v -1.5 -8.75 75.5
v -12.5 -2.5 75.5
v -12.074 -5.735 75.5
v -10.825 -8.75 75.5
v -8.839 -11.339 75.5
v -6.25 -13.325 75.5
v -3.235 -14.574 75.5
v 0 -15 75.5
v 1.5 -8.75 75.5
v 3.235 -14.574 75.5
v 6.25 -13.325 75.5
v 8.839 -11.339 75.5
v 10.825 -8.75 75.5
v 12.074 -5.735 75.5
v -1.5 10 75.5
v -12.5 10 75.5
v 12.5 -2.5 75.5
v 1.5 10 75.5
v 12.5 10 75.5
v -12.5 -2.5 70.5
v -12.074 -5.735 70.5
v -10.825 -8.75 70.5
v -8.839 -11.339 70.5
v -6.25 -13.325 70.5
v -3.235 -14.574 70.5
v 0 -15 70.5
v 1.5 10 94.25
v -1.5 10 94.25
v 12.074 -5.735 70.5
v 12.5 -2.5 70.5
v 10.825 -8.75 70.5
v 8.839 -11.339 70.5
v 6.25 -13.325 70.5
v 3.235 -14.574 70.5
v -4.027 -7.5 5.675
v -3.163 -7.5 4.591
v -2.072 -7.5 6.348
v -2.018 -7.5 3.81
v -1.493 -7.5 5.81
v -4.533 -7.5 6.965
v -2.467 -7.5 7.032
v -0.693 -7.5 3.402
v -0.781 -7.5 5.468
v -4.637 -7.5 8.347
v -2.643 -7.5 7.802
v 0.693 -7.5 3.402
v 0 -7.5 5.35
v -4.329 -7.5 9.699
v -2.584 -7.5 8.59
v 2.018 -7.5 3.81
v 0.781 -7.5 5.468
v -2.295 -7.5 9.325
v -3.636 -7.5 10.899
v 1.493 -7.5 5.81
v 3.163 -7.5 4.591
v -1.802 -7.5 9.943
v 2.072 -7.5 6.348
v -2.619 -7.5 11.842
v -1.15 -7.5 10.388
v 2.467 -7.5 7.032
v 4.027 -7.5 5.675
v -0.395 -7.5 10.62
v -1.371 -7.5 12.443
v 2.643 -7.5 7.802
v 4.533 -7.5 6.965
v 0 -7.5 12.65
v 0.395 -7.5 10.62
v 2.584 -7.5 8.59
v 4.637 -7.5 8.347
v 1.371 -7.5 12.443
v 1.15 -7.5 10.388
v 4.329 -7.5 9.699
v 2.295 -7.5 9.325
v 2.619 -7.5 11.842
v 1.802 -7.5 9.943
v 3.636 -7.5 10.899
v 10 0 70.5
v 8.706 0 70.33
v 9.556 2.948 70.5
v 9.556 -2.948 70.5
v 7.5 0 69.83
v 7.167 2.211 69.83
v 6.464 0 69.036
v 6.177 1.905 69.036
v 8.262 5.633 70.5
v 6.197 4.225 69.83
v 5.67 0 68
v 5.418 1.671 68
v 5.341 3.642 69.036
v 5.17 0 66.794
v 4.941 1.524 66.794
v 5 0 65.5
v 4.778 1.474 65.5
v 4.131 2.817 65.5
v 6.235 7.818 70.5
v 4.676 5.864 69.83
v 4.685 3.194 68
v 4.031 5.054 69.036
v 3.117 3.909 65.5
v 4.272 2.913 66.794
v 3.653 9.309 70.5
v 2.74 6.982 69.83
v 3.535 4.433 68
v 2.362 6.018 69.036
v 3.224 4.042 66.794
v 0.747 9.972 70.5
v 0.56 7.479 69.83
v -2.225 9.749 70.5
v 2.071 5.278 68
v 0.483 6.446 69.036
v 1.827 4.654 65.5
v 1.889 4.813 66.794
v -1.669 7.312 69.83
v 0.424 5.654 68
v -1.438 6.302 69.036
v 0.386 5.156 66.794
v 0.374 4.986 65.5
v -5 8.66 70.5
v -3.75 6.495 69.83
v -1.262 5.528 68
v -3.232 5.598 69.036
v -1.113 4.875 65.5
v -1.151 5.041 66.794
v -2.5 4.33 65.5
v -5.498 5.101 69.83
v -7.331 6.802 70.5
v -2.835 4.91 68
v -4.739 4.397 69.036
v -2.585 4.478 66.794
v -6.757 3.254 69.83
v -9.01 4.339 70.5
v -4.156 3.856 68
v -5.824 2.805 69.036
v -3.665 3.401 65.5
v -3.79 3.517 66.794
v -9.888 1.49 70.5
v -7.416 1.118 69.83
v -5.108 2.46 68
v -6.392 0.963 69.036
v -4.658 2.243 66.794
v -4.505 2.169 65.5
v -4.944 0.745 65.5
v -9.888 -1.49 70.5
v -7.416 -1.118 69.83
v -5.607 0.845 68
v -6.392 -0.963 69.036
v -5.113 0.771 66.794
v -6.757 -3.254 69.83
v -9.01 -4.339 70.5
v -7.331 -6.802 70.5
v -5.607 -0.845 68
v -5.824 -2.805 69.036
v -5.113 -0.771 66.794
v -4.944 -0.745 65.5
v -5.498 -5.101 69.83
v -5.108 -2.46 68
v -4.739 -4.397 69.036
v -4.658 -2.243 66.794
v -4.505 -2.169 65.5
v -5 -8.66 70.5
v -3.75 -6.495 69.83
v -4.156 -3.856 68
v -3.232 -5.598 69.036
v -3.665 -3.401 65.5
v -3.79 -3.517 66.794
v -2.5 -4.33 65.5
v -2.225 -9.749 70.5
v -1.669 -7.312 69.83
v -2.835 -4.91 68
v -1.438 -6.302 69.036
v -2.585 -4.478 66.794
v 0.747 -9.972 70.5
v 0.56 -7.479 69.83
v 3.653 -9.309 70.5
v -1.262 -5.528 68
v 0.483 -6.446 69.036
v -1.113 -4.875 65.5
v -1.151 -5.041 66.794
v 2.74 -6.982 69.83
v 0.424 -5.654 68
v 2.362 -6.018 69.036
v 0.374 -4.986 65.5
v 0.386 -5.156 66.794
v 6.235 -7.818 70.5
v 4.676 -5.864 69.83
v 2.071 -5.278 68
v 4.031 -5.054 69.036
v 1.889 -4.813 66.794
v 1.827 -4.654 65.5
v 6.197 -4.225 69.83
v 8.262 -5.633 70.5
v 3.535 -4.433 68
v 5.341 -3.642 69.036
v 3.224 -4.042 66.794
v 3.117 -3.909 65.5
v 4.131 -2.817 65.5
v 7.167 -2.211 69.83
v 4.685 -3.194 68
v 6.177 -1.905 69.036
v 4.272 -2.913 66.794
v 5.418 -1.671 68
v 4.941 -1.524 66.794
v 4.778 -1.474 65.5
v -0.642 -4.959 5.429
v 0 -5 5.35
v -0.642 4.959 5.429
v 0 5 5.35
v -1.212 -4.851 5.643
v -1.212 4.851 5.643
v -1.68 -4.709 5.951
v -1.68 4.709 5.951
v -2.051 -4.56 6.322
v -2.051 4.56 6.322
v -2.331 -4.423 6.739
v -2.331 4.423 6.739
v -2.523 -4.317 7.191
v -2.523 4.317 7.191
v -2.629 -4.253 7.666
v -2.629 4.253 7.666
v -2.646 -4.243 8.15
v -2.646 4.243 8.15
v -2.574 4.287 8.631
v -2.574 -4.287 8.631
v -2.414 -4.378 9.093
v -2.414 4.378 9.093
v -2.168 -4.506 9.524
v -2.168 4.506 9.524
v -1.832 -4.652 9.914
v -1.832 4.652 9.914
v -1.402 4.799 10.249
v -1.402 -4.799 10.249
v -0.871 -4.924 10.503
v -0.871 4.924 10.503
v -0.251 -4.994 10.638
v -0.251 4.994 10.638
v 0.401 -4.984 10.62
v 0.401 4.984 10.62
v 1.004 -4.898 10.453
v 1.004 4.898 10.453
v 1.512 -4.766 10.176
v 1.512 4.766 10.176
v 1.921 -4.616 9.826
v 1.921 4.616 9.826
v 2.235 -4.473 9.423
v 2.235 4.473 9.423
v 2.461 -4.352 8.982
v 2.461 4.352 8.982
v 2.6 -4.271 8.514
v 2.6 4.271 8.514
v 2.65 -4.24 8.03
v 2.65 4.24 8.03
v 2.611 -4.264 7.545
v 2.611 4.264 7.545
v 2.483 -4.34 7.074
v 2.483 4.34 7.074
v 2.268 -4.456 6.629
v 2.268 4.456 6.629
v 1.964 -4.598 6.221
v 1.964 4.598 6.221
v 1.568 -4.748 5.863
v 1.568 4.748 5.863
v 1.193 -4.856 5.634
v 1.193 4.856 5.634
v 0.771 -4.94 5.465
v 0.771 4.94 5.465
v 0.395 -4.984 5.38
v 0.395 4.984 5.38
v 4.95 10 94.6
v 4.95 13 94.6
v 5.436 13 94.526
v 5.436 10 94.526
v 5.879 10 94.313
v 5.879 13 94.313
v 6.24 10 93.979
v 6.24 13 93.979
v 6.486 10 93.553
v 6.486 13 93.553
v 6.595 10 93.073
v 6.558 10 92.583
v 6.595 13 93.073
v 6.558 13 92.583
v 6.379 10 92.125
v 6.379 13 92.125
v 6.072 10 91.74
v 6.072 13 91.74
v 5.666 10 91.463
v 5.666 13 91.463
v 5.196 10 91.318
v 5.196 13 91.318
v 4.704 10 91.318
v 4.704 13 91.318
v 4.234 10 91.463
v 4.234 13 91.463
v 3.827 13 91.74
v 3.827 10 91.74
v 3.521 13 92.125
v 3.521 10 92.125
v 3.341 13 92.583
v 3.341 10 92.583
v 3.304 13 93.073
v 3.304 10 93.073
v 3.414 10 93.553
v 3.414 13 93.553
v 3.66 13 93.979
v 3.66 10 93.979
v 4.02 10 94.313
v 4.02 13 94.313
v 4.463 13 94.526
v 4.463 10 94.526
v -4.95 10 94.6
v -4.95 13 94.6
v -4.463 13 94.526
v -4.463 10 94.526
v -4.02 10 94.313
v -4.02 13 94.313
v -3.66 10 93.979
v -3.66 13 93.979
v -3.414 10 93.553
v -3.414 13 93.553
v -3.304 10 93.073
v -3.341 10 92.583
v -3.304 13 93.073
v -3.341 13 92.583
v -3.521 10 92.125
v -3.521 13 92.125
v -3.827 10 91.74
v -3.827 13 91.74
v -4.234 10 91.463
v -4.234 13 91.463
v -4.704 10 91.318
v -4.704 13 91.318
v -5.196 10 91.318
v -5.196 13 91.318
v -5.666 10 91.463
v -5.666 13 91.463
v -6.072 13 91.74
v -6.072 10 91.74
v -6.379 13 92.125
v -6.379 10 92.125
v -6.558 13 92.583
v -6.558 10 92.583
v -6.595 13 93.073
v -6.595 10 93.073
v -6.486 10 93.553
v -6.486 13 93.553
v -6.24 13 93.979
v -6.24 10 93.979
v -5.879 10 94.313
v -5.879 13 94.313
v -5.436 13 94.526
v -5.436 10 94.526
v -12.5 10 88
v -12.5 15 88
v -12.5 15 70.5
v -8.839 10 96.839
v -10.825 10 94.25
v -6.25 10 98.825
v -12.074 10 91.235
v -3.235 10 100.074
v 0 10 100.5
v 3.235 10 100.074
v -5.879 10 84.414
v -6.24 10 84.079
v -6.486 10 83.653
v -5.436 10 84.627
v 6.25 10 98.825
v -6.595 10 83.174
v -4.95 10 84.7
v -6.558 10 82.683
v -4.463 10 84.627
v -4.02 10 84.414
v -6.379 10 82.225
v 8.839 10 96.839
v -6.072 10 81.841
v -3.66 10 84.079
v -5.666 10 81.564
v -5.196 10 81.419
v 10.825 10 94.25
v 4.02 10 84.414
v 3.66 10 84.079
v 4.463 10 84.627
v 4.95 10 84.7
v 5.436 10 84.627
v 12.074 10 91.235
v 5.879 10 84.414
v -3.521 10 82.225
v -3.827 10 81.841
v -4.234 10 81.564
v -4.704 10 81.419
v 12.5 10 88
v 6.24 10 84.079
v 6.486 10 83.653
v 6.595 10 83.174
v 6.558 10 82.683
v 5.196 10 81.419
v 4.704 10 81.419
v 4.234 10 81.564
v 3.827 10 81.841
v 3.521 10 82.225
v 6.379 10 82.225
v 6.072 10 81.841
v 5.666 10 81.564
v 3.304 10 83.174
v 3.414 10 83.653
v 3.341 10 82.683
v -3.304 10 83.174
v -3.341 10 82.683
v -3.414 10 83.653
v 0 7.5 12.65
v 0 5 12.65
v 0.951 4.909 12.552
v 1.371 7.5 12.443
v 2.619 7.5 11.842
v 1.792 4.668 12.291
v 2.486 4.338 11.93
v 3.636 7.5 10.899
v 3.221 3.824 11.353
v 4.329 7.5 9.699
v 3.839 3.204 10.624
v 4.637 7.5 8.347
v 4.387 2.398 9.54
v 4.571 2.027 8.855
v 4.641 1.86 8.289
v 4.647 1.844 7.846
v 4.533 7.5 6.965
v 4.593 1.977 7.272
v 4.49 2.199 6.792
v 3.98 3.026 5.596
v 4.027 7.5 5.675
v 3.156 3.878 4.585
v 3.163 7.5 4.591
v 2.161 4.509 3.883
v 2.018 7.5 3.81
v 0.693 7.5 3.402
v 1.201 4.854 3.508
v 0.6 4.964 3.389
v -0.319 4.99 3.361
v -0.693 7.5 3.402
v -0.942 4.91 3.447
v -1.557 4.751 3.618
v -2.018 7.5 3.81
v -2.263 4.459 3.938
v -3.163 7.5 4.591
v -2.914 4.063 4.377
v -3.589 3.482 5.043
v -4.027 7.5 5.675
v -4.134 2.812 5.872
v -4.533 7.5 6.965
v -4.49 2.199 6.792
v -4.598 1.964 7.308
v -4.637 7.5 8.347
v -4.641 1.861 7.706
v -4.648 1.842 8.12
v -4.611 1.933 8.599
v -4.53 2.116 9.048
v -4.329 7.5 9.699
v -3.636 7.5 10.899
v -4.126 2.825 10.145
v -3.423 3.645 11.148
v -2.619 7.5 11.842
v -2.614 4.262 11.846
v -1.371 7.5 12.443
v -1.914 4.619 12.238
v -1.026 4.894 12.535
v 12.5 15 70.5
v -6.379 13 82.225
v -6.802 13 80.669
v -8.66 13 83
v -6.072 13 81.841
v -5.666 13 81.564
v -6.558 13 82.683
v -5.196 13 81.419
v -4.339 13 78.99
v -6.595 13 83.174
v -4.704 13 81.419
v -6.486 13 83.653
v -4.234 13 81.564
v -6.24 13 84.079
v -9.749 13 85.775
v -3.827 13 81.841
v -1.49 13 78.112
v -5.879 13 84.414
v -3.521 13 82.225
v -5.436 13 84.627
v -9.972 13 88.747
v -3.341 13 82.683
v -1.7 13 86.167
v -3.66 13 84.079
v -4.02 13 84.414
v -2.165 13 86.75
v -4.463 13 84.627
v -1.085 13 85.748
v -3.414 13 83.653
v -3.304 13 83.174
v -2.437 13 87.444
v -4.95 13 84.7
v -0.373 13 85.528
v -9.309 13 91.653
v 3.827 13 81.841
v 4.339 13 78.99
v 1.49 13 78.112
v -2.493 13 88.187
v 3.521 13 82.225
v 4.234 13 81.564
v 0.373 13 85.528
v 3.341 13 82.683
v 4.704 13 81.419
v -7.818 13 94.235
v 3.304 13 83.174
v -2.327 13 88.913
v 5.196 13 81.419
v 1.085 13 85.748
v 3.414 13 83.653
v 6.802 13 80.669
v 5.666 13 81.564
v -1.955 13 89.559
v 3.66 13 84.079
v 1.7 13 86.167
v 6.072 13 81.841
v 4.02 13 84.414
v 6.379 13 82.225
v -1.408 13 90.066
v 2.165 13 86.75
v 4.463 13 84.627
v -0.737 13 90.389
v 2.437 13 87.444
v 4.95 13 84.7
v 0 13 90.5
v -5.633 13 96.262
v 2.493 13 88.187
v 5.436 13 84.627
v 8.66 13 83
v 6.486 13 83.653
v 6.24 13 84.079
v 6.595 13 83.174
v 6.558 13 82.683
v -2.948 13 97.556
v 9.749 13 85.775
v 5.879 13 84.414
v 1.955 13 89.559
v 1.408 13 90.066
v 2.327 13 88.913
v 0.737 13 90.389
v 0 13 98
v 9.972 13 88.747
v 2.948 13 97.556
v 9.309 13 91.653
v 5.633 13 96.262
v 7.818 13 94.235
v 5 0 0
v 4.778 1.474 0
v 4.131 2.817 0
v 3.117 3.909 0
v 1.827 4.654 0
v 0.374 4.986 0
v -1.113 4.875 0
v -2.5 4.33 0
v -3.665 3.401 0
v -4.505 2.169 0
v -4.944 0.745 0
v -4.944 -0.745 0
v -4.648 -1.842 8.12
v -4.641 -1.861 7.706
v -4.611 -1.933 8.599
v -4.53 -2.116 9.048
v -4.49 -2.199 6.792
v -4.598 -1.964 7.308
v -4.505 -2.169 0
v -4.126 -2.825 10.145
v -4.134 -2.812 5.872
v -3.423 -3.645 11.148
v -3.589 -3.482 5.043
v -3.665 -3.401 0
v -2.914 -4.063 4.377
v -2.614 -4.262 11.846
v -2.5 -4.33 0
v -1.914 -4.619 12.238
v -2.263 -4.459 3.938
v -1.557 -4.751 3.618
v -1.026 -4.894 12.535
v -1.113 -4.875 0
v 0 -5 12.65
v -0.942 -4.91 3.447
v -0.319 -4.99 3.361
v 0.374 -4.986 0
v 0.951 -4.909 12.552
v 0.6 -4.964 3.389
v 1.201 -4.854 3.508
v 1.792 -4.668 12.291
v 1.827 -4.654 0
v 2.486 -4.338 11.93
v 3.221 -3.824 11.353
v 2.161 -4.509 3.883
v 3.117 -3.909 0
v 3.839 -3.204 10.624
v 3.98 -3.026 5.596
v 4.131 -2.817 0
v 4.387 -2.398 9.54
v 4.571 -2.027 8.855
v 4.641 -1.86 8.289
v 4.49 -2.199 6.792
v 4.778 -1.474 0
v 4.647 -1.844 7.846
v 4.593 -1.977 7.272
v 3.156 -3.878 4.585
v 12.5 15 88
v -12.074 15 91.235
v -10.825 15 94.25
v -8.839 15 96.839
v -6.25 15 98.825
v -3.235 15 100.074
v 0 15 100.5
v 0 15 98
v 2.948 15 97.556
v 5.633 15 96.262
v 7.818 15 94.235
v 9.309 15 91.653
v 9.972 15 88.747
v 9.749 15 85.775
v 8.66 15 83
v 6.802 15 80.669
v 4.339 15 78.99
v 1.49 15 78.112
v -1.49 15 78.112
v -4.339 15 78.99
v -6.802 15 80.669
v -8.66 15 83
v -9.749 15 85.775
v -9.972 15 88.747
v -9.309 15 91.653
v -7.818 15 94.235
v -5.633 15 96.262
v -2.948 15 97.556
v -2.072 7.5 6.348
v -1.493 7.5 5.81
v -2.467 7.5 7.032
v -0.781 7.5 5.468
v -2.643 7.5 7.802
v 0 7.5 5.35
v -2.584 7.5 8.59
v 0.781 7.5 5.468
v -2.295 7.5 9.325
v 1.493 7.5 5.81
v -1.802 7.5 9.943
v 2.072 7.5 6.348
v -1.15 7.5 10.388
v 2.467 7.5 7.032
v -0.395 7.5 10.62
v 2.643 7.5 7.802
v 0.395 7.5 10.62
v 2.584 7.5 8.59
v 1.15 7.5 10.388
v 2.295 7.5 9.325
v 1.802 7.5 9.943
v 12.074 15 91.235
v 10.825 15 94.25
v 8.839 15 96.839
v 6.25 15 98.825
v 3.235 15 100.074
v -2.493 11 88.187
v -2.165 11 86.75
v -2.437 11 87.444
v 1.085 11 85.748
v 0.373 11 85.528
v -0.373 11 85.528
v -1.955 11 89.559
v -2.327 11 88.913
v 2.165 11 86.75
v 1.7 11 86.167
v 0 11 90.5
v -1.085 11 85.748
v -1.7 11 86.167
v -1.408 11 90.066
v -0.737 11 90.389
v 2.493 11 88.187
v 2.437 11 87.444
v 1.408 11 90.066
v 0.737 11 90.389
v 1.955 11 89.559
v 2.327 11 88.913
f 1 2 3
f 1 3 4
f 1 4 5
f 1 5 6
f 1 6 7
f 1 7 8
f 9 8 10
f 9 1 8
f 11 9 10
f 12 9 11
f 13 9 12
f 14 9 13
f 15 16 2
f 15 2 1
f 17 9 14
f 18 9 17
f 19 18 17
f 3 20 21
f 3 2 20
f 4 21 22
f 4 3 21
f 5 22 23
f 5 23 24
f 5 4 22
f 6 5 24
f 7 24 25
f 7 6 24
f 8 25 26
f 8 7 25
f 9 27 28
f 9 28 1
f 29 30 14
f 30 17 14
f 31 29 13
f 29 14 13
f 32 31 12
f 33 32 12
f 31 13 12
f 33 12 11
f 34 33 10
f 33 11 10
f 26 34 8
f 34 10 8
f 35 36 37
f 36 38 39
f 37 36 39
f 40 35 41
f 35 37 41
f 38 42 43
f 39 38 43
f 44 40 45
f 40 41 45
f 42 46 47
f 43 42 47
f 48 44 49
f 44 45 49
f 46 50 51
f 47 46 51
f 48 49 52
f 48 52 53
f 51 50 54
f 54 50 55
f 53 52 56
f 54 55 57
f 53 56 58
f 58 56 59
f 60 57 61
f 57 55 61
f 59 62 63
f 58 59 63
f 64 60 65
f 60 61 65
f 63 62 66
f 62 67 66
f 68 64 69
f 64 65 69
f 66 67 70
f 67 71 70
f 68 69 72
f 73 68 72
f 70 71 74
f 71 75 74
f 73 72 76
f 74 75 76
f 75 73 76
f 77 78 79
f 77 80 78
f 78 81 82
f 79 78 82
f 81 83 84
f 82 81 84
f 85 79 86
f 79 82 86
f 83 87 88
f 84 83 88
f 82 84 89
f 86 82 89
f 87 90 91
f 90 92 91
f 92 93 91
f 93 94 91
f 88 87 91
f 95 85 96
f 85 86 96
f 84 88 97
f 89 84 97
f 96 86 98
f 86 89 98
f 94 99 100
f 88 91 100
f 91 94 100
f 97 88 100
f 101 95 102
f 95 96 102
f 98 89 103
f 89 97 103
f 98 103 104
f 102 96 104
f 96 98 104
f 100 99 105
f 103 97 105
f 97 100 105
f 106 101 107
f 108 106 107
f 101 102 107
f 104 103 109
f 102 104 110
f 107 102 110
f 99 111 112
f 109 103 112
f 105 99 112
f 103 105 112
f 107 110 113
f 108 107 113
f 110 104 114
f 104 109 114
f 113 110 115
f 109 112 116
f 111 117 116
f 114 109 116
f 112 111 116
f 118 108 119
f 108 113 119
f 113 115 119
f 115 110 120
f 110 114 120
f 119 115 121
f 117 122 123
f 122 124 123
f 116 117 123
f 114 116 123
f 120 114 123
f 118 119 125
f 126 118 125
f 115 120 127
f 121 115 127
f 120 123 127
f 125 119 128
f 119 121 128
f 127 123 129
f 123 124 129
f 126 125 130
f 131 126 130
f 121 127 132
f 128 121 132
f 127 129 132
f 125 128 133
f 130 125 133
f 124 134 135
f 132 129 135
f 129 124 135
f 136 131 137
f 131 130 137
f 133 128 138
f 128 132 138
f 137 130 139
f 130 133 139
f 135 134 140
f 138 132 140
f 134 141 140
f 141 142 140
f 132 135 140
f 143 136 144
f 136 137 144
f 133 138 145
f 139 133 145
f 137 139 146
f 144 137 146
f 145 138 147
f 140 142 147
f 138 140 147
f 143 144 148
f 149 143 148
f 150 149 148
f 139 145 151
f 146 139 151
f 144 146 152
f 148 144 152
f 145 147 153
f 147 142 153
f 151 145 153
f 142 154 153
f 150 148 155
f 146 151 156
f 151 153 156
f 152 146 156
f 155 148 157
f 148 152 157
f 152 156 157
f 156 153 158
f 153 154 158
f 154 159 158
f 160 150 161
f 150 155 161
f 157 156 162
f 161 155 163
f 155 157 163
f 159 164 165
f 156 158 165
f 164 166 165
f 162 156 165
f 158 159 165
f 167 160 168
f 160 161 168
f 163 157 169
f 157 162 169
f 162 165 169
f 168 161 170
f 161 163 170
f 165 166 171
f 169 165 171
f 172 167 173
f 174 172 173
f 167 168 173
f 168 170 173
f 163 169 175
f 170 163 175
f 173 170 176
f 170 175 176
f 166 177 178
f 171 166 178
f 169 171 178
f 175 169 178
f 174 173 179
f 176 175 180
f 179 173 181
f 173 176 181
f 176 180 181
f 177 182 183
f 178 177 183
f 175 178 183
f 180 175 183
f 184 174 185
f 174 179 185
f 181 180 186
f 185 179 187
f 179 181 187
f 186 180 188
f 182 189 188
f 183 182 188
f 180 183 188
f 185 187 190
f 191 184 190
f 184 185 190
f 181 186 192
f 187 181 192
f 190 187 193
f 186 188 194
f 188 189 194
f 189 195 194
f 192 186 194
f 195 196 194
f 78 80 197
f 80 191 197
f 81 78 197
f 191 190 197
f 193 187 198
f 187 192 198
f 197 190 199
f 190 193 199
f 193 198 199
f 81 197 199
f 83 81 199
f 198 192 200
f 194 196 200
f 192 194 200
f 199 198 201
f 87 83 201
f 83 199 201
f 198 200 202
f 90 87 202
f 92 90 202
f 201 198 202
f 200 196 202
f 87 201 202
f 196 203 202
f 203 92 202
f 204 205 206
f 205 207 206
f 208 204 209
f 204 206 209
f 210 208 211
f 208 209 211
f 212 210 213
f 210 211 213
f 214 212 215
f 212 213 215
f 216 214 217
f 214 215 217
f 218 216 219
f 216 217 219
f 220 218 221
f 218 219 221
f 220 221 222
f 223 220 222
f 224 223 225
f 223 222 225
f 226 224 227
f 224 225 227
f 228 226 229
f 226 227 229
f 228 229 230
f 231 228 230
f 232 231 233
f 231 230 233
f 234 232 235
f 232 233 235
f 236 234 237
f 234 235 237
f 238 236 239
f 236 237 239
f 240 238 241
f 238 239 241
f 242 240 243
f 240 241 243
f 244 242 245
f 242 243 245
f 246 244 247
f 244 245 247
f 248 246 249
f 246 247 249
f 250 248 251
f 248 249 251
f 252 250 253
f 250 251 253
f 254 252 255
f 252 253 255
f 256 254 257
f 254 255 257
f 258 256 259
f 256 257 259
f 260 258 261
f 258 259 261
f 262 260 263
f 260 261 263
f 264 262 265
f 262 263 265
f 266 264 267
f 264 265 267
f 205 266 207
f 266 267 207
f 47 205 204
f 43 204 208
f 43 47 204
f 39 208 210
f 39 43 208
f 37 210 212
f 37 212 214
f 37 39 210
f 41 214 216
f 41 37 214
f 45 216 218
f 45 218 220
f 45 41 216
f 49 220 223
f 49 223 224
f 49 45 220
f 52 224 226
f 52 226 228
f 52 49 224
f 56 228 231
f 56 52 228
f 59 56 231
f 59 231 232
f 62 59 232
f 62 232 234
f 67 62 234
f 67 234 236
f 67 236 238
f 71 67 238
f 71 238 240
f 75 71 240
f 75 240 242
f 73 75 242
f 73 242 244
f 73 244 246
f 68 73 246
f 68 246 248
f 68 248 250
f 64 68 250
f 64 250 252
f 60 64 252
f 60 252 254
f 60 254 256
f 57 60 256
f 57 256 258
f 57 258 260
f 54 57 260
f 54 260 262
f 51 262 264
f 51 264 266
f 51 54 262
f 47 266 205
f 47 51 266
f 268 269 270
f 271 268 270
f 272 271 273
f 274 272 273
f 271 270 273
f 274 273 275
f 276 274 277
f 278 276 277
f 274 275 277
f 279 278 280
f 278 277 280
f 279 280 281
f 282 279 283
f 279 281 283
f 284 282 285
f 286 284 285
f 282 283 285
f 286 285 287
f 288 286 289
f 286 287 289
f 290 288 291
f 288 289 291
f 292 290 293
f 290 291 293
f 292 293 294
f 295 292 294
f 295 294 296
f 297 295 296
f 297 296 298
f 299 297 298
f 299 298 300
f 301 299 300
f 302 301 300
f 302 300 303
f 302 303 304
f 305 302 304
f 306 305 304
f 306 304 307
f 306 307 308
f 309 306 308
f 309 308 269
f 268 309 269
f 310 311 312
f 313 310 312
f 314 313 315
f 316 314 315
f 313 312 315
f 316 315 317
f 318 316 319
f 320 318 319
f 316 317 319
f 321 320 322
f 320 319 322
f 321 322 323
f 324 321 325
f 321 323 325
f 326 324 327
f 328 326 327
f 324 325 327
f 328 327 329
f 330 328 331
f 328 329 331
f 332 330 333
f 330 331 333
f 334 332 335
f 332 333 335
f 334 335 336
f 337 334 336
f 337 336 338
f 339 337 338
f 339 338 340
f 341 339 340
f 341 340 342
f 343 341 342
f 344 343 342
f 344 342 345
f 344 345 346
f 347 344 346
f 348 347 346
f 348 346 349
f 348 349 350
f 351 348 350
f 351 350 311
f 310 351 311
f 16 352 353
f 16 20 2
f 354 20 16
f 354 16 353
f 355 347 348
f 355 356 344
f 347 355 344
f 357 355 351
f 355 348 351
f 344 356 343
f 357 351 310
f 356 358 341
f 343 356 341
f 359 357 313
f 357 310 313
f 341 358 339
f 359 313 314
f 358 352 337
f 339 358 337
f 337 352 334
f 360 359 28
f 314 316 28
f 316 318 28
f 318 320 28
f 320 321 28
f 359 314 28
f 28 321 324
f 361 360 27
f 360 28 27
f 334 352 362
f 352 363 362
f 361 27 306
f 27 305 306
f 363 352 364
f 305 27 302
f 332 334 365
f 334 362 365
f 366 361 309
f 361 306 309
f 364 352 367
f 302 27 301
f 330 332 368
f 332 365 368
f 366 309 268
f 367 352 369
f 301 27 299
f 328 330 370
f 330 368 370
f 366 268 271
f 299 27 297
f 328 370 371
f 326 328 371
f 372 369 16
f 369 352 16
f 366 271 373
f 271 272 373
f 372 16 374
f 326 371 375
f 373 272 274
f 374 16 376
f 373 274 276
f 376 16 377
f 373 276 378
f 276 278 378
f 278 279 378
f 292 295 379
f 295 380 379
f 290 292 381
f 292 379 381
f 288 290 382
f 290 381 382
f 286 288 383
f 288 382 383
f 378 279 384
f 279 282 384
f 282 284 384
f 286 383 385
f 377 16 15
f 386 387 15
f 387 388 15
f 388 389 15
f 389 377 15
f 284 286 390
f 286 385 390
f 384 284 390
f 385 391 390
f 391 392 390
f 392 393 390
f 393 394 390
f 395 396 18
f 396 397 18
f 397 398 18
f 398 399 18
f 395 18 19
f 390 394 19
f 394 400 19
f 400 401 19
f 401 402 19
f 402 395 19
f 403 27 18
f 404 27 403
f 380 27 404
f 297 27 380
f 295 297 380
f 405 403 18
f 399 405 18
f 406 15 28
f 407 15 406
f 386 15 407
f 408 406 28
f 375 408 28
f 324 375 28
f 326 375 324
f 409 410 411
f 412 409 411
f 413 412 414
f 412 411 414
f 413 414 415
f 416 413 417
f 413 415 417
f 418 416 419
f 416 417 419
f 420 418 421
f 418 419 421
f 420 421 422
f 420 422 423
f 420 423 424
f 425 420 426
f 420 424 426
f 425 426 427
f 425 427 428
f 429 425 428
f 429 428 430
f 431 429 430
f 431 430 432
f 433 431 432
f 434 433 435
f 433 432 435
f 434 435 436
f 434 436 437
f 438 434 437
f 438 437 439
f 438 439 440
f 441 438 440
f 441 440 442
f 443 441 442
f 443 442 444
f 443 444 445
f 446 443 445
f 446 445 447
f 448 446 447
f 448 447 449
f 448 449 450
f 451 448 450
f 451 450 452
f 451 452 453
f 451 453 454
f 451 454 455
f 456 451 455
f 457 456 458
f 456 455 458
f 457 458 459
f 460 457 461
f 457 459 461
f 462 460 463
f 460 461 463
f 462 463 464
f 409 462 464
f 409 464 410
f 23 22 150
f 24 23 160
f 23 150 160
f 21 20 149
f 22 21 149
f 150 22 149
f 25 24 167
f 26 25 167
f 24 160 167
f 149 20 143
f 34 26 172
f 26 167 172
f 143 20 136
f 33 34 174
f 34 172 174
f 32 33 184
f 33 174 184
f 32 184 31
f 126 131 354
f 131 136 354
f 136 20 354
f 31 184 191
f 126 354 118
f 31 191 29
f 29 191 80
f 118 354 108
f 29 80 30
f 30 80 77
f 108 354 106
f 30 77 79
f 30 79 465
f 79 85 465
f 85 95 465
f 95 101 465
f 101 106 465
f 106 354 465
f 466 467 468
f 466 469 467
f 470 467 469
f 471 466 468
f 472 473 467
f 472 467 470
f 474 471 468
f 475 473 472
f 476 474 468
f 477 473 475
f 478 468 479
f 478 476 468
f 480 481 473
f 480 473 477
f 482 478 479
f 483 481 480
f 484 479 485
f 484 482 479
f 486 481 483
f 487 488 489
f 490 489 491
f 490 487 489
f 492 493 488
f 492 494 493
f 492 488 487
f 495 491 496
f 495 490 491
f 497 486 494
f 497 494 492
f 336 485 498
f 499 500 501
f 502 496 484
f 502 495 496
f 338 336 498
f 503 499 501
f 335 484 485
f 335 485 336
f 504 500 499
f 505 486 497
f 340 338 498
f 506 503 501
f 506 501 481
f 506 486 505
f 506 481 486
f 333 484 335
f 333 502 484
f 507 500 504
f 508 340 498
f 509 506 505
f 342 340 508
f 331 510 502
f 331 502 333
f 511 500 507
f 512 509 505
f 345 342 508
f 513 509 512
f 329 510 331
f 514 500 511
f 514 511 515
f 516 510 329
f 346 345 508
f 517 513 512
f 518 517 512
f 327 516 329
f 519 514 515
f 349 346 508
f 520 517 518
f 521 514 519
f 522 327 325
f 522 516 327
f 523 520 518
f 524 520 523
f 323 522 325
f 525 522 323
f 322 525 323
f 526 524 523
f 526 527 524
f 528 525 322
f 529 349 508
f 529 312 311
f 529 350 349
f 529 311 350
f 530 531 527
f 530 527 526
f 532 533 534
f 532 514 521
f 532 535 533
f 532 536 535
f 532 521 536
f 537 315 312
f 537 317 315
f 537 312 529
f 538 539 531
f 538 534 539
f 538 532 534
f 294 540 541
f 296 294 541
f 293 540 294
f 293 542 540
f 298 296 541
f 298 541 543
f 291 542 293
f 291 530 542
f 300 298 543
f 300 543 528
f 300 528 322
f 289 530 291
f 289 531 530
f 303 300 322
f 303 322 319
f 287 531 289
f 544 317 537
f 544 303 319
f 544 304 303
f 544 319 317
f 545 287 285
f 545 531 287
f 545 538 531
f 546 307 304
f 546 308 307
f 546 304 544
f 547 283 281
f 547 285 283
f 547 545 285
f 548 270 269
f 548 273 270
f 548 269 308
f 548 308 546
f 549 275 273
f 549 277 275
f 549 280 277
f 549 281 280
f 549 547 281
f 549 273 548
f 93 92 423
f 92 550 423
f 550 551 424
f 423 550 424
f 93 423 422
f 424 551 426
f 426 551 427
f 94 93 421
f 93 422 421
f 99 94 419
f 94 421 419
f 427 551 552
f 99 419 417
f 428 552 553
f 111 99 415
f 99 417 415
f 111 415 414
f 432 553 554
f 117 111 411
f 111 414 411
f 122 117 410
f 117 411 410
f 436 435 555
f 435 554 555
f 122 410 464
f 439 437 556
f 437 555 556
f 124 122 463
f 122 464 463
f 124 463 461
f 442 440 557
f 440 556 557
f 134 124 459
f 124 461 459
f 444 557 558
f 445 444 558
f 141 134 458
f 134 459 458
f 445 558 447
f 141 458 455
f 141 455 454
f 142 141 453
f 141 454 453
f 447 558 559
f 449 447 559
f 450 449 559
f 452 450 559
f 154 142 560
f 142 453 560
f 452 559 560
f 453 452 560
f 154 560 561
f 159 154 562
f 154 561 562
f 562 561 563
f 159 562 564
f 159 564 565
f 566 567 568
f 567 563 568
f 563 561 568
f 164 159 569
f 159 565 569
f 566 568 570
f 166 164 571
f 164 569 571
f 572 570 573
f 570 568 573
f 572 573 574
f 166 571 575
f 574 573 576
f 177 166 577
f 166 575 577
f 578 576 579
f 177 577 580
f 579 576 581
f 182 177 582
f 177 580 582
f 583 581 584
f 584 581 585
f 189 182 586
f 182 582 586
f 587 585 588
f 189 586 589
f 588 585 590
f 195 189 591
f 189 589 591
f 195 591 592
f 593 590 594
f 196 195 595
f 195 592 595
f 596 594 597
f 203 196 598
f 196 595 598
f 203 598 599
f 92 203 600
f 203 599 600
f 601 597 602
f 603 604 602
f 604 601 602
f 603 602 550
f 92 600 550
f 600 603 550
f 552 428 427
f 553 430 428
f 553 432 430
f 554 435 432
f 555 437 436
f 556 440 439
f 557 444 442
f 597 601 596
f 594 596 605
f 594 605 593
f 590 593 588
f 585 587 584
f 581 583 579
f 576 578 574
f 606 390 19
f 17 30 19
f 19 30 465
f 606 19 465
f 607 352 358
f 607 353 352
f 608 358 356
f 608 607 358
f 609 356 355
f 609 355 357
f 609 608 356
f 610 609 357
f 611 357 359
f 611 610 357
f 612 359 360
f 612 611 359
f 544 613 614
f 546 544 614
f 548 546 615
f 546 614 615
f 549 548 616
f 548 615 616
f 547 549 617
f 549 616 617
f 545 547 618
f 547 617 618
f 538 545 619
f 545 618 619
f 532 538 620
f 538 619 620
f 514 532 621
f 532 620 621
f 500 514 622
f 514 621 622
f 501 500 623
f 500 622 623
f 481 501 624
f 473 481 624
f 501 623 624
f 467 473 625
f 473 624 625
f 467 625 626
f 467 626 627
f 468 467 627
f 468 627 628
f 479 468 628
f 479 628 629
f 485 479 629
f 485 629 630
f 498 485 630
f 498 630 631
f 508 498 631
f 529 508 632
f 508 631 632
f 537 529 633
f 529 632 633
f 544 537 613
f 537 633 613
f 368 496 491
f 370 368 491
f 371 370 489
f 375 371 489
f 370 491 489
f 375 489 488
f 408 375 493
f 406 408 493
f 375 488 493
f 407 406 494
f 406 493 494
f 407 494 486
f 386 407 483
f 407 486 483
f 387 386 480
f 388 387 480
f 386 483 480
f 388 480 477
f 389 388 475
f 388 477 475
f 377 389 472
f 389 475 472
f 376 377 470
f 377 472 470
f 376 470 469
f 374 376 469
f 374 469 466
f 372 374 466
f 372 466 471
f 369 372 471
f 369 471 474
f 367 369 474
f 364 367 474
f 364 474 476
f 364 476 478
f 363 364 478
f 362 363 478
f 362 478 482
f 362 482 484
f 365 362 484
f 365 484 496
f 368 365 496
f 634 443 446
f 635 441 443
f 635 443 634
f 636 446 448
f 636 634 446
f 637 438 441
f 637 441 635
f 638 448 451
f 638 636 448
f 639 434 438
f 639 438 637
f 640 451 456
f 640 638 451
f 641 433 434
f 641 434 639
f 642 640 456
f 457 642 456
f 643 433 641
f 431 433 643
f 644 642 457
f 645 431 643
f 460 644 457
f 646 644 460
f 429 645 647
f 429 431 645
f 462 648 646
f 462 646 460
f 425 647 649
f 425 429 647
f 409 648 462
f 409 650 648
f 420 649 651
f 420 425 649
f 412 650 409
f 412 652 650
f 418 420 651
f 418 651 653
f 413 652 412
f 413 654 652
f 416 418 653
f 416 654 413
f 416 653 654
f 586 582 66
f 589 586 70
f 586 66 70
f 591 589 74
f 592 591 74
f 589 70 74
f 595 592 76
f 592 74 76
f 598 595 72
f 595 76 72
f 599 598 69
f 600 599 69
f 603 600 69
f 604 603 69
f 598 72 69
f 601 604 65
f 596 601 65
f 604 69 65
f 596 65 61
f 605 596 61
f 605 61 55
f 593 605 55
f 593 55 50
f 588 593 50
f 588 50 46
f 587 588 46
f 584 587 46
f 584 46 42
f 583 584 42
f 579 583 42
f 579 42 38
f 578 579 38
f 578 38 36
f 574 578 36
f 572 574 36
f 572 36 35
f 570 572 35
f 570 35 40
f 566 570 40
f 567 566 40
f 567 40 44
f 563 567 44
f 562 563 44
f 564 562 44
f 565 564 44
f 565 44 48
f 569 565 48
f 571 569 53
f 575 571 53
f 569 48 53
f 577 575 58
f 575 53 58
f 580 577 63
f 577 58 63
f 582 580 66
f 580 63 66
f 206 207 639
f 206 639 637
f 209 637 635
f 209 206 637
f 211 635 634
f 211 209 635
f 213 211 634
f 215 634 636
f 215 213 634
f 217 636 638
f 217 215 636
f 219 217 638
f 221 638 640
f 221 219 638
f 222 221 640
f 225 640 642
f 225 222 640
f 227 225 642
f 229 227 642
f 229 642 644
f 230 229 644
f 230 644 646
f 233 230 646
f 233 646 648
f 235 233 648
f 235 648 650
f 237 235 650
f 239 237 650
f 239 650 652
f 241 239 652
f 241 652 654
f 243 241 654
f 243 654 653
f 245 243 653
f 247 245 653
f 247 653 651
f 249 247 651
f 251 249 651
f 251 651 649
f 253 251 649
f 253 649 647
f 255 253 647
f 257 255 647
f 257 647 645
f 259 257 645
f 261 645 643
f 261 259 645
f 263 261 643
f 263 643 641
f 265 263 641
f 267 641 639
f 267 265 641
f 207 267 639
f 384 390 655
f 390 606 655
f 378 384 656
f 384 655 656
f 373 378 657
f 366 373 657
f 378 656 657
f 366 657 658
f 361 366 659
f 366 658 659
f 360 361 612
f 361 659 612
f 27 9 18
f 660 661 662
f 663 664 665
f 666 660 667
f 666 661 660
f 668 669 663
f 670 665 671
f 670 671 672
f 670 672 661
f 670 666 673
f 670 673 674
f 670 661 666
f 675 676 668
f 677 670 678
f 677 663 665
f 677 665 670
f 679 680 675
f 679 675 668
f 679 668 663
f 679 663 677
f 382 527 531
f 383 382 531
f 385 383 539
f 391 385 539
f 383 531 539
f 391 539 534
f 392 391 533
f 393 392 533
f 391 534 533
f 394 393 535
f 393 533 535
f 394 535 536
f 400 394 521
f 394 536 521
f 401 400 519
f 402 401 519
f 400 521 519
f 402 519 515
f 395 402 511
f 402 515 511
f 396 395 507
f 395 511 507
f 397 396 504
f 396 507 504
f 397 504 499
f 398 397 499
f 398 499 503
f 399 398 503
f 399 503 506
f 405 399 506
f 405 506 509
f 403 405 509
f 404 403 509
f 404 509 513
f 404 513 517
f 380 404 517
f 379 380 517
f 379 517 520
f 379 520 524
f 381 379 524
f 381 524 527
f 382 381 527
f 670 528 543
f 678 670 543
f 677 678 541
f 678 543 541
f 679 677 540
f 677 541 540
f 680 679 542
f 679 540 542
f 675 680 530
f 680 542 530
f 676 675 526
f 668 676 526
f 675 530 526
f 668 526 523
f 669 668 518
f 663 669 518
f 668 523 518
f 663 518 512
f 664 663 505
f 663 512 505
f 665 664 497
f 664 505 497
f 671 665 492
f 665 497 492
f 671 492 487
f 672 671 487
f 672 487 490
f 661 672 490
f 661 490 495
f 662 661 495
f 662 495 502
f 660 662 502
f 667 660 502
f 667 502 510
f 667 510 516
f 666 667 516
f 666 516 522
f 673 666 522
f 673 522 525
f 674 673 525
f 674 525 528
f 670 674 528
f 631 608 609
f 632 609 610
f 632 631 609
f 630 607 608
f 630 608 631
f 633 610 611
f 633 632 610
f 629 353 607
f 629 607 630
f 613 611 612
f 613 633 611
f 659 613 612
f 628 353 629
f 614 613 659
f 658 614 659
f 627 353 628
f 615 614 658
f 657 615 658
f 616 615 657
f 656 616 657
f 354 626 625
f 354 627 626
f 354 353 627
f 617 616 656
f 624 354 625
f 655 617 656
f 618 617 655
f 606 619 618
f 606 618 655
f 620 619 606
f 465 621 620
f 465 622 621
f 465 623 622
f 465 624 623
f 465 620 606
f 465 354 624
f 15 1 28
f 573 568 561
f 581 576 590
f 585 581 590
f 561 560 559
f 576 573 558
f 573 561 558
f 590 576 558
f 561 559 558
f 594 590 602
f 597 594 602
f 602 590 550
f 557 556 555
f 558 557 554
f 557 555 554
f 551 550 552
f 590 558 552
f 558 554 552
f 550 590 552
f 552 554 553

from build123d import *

# Parameters (mm, degrees)
SKETCH1_R                           = 5
BOSS_EXTRUDE1_DEPTH                 = 70.5
SKETCH3_W                           = 25
SKETCH3_H                           = 30
BOSS_EXTRUDE3_DEPTH                 = 5
SKETCH4_W                           = 25
SKETCH4_H                           = 5
BOSS_EXTRUDE4_DEPTH                 = 25
FILLET3_R                           = 12.5
CUT_EXTRUDE1_REACH                  = 107.624
SKETCH6_R                           = 1.65
SKETCH6_3_R                         = 10
SKETCH6_3_R_2                       = 1.65
SKETCH6_3_R_3                       = 2.5
CUT_EXTRUDE2_DEPTH                  = 2
SKETCH6_4_R                         = 2.5
CUT_EXTRUDE3_DEPTH                  = 4
FILLET4_R                           = 5
CUT_EXTRUDE4_REACH                  = 104.379
CUT_EXTRUDE4_END_RADIUS             = 5
SKETCH7_R                           = 2.65
CUT_EXTRUDE4_DIRECTION_2_REACH      = 104.379
CUT_EXTRUDE4_DIRECTION_2_END_RADIUS = 5
BOSS_EXTRUDE6_DEPTH                 = 7.5
BOSS_EXTRUDE6_DEPTH_BACK            = 7.5
SKETCH7_3_R                         = 4.65
SKETCH7_3_R_2                       = 2.65
BOSS_EXTRUDE7_DEPTH                 = 1.5
BOSS_EXTRUDE7_DEPTH_BACK            = 1.5


with BuildPart() as part:
    # Sketch1 → Boss-Extrude1 (new body)
    with BuildSketch(Plane(origin=(0, 0, 0), x_dir=(0, 1, 0), z_dir=(0, 0, 1))):
        with Locations(Location((0, 0, 0), (0, 0, 270))):
            Circle(SKETCH1_R)
    extrude(amount=BOSS_EXTRUDE1_DEPTH)

    # Sketch3 → Boss-Extrude3 (add)
    with BuildSketch(Plane.XY.offset(70.5)):
        Rectangle(SKETCH3_W, SKETCH3_H)
    extrude(amount=BOSS_EXTRUDE3_DEPTH)

    # Sketch4 → Boss-Extrude4 (add)
    with BuildSketch(Plane.XY.offset(75.5)):
        with Locations((0, 12.5)):
            Rectangle(SKETCH4_W, SKETCH4_H)
    extrude(amount=BOSS_EXTRUDE4_DEPTH)

    # Fillet3
    fillet3_edges = [part.edges().sort_by_distance(p)[0] for p in [
        (12.5, 12.5, 100.5),
        (-12.5, 12.5, 100.5),
        (-12.5, -15, 73),
        (12.5, -15, 73),
    ]]
    fillet(fillet3_edges, radius=FILLET3_R - 0.0001)  # a hair under: the kernel refuses the full size

    # Sketch6 → Cut-Extrude1 (cut, up to next)
    with BuildSketch(Plane(origin=(0, 15, 0), x_dir=(-1, 0, 0), z_dir=(0, 1, 0)), mode=Mode.PRIVATE) as cut_extrude1_sk1:
        with Locations(Location((-4.949747468, 92.949747468, 0), (0, 0, 90))):
            Circle(SKETCH6_R)
    cut_extrude1_tool1 = extrude(cut_extrude1_sk1.sketch, amount=-CUT_EXTRUDE1_REACH, mode=Mode.PRIVATE) & part.part
    # Sketch6 → Cut-Extrude1 (cut, up to next)
    with BuildSketch(Plane(origin=(0, 15, 0), x_dir=(-1, 0, 0), z_dir=(0, 1, 0)), mode=Mode.PRIVATE) as cut_extrude1_sk2:
        with Locations(Location((4.949747468, 92.949747468, 0), (0, 0, 90))):
            Circle(SKETCH6_R)
    cut_extrude1_tool2 = extrude(cut_extrude1_sk2.sketch, amount=-CUT_EXTRUDE1_REACH, mode=Mode.PRIVATE) & part.part
    # Sketch6 → Cut-Extrude1 (cut, up to next)
    with BuildSketch(Plane(origin=(0, 15, 0), x_dir=(-1, 0, 0), z_dir=(0, 1, 0)), mode=Mode.PRIVATE) as cut_extrude1_sk3:
        with Locations(Location((-4.949747468, 83.050252532, 0), (0, 0, 90))):
            Circle(SKETCH6_R)
    cut_extrude1_tool3 = extrude(cut_extrude1_sk3.sketch, amount=-CUT_EXTRUDE1_REACH, mode=Mode.PRIVATE) & part.part
    # Sketch6 → Cut-Extrude1 (cut, up to next)
    with BuildSketch(Plane(origin=(0, 15, 0), x_dir=(-1, 0, 0), z_dir=(0, 1, 0)), mode=Mode.PRIVATE) as cut_extrude1_sk4:
        with Locations(Location((4.949747468, 83.050252532, 0), (0, 0, 90))):
            Circle(SKETCH6_R)
    cut_extrude1_tool4 = extrude(cut_extrude1_sk4.sketch, amount=-CUT_EXTRUDE1_REACH, mode=Mode.PRIVATE) & part.part
    add(cut_extrude1_tool1.solids().sort_by_distance((4.949747, 15, 92.949747))[0], mode=Mode.SUBTRACT)
    add(cut_extrude1_tool2.solids().sort_by_distance((-4.949747, 15, 92.949747))[0], mode=Mode.SUBTRACT)
    add(cut_extrude1_tool3.solids().sort_by_distance((4.949747, 15, 83.050253))[0], mode=Mode.SUBTRACT)
    add(cut_extrude1_tool4.solids().sort_by_distance((-4.949747, 15, 83.050253))[0], mode=Mode.SUBTRACT)

    # Sketch6<3> → Cut-Extrude2 (cut)
    # profile 1 of 6: a face of its own
    with BuildSketch(Plane(origin=(0, 15, 0), x_dir=(-1, 0, 0), z_dir=(0, 1, 0))):
        with Locations(Location((0, 88, 0), (0, 0, 90))):
            Circle(SKETCH6_3_R)
        with Locations(Location((4.949747468, 83.050252532, 0), (0, 0, 90))):
            Circle(SKETCH6_3_R_2, mode=Mode.SUBTRACT)
        with Locations(Location((-4.949747468, 83.050252532, 0), (0, 0, 90))):
            Circle(SKETCH6_3_R_2, mode=Mode.SUBTRACT)
        with Locations(Location((4.949747468, 92.949747468, 0), (0, 0, 90))):
            Circle(SKETCH6_3_R_2, mode=Mode.SUBTRACT)
        with Locations(Location((-4.949747468, 92.949747468, 0), (0, 0, 90))):
            Circle(SKETCH6_3_R_2, mode=Mode.SUBTRACT)
        with Locations((0, 88)):
            Circle(SKETCH6_3_R_3, mode=Mode.SUBTRACT)
    # profile 2 of 6: a face of its own
    with BuildSketch(Plane(origin=(0, 15, 0), x_dir=(-1, 0, 0), z_dir=(0, 1, 0))):
        with Locations(Location((4.949747468, 92.949747468, 0), (0, 0, 90))):
            Circle(SKETCH6_3_R_2)
    # profile 3 of 6: a face of its own
    with BuildSketch(Plane(origin=(0, 15, 0), x_dir=(-1, 0, 0), z_dir=(0, 1, 0))):
        with Locations(Location((-4.949747468, 92.949747468, 0), (0, 0, 90))):
            Circle(SKETCH6_3_R_2)
    # profile 4 of 6: a face of its own
    with BuildSketch(Plane(origin=(0, 15, 0), x_dir=(-1, 0, 0), z_dir=(0, 1, 0))):
        with Locations(Location((-4.949747468, 83.050252532, 0), (0, 0, 90))):
            Circle(SKETCH6_3_R_2)
    # profile 5 of 6: a face of its own
    with BuildSketch(Plane(origin=(0, 15, 0), x_dir=(-1, 0, 0), z_dir=(0, 1, 0))):
        with Locations(Location((4.949747468, 83.050252532, 0), (0, 0, 90))):
            Circle(SKETCH6_3_R_2)
    # profile 6 of 6: a face of its own
    with BuildSketch(Plane(origin=(0, 15, 0), x_dir=(-1, 0, 0), z_dir=(0, 1, 0))):
        with Locations((0, 88)):
            Circle(SKETCH6_3_R_3)
    extrude(amount=-CUT_EXTRUDE2_DEPTH, mode=Mode.SUBTRACT)

    # Sketch6<4> → Cut-Extrude3 (cut)
    with BuildSketch(Plane(origin=(0, 15, 0), x_dir=(-1, 0, 0), z_dir=(0, 1, 0))):
        with Locations(Location((0, 88, 0), (0, 0, 90))):
            Circle(SKETCH6_4_R)
    extrude(amount=-CUT_EXTRUDE3_DEPTH, mode=Mode.SUBTRACT)

    # Fillet4
    fillet4_edges = [part.edges().sort_by_distance(p)[0] for p in [
        (-5, 0, 70.5),
    ]]
    fillet(fillet4_edges, radius=FILLET4_R)

    # Cut-Extrude4: up to this cylinder (the profile starts inside it)
    cut_extrude4_end = Plane(origin=(0, 0, 8), z_dir=(0, 0, -1)) * Cylinder(CUT_EXTRUDE4_END_RADIUS, 219.758, mode=Mode.PRIVATE)
    # Sketch7 → Cut-Extrude4 (cut, up to the surface)
    with BuildSketch(Plane(origin=(0, 0, 0), x_dir=(-1, 0, 0), z_dir=(0, 1, 0)), mode=Mode.PRIVATE) as cut_extrude4_sk1:
        with Locations(Location((0, 8, 0), (0, 0, 270))):
            Circle(SKETCH7_R)
    cut_extrude4_tool1 = extrude(cut_extrude4_sk1.sketch, amount=-CUT_EXTRUDE4_REACH, mode=Mode.PRIVATE) & cut_extrude4_end
    add(cut_extrude4_tool1.solids().sort_by_distance((0, 0, 8))[0], mode=Mode.SUBTRACT)

    # Cut-Extrude4 direction 2: up to this cylinder (the profile starts inside it)
    cut_extrude4_direction_2_end = Plane(origin=(0, 0, 8), z_dir=(0, 0, -1)) * Cylinder(CUT_EXTRUDE4_DIRECTION_2_END_RADIUS, 219.758, mode=Mode.PRIVATE)
    # Sketch7 → Cut-Extrude4 direction 2 (cut, up to the surface)
    with BuildSketch(Plane(origin=(0, 0, 0), x_dir=(-1, 0, 0), z_dir=(0, 1, 0)), mode=Mode.PRIVATE) as cut_extrude4_direction_2_sk1:
        with Locations(Location((0, 8, 0), (0, 0, 270))):
            Circle(SKETCH7_R)
    cut_extrude4_direction_2_tool1 = extrude(cut_extrude4_direction_2_sk1.sketch, amount=CUT_EXTRUDE4_DIRECTION_2_REACH, mode=Mode.PRIVATE) & cut_extrude4_direction_2_end
    add(cut_extrude4_direction_2_tool1.solids().sort_by_distance((0, 0, 8))[0], mode=Mode.SUBTRACT)

    # Sketch7<3> → Boss-Extrude6 (add, two sides: drawn at the far end of the back side and taken through both)
    with BuildSketch(Plane(origin=(0, 0, 0), x_dir=(-1, 0, 0), z_dir=(0, 1, 0)).offset(-BOSS_EXTRUDE6_DEPTH_BACK)):
        with Locations(Location((0, 8, 0), (0, 0, 90))):
            Circle(SKETCH7_3_R)
        with Locations(Location((0, 8, 0), (0, 0, 270))):
            Circle(SKETCH7_3_R_2, mode=Mode.SUBTRACT)
    extrude(amount=BOSS_EXTRUDE6_DEPTH + BOSS_EXTRUDE6_DEPTH_BACK)

    # Sketch9 → Boss-Extrude7 (add, two sides: drawn at the far end of the back side and taken through both)
    with BuildSketch(Plane(origin=(0, 0, 0), x_dir=(0, -1, 0), z_dir=(-1, 0, 0)).offset(-BOSS_EXTRUDE7_DEPTH_BACK)):
        Polygon((-10, 94.25), (8.75, 75.5), (-10, 75.5), align=None)
    extrude(amount=BOSS_EXTRUDE7_DEPTH + BOSS_EXTRUDE7_DEPTH_BACK)


solid = part.part
